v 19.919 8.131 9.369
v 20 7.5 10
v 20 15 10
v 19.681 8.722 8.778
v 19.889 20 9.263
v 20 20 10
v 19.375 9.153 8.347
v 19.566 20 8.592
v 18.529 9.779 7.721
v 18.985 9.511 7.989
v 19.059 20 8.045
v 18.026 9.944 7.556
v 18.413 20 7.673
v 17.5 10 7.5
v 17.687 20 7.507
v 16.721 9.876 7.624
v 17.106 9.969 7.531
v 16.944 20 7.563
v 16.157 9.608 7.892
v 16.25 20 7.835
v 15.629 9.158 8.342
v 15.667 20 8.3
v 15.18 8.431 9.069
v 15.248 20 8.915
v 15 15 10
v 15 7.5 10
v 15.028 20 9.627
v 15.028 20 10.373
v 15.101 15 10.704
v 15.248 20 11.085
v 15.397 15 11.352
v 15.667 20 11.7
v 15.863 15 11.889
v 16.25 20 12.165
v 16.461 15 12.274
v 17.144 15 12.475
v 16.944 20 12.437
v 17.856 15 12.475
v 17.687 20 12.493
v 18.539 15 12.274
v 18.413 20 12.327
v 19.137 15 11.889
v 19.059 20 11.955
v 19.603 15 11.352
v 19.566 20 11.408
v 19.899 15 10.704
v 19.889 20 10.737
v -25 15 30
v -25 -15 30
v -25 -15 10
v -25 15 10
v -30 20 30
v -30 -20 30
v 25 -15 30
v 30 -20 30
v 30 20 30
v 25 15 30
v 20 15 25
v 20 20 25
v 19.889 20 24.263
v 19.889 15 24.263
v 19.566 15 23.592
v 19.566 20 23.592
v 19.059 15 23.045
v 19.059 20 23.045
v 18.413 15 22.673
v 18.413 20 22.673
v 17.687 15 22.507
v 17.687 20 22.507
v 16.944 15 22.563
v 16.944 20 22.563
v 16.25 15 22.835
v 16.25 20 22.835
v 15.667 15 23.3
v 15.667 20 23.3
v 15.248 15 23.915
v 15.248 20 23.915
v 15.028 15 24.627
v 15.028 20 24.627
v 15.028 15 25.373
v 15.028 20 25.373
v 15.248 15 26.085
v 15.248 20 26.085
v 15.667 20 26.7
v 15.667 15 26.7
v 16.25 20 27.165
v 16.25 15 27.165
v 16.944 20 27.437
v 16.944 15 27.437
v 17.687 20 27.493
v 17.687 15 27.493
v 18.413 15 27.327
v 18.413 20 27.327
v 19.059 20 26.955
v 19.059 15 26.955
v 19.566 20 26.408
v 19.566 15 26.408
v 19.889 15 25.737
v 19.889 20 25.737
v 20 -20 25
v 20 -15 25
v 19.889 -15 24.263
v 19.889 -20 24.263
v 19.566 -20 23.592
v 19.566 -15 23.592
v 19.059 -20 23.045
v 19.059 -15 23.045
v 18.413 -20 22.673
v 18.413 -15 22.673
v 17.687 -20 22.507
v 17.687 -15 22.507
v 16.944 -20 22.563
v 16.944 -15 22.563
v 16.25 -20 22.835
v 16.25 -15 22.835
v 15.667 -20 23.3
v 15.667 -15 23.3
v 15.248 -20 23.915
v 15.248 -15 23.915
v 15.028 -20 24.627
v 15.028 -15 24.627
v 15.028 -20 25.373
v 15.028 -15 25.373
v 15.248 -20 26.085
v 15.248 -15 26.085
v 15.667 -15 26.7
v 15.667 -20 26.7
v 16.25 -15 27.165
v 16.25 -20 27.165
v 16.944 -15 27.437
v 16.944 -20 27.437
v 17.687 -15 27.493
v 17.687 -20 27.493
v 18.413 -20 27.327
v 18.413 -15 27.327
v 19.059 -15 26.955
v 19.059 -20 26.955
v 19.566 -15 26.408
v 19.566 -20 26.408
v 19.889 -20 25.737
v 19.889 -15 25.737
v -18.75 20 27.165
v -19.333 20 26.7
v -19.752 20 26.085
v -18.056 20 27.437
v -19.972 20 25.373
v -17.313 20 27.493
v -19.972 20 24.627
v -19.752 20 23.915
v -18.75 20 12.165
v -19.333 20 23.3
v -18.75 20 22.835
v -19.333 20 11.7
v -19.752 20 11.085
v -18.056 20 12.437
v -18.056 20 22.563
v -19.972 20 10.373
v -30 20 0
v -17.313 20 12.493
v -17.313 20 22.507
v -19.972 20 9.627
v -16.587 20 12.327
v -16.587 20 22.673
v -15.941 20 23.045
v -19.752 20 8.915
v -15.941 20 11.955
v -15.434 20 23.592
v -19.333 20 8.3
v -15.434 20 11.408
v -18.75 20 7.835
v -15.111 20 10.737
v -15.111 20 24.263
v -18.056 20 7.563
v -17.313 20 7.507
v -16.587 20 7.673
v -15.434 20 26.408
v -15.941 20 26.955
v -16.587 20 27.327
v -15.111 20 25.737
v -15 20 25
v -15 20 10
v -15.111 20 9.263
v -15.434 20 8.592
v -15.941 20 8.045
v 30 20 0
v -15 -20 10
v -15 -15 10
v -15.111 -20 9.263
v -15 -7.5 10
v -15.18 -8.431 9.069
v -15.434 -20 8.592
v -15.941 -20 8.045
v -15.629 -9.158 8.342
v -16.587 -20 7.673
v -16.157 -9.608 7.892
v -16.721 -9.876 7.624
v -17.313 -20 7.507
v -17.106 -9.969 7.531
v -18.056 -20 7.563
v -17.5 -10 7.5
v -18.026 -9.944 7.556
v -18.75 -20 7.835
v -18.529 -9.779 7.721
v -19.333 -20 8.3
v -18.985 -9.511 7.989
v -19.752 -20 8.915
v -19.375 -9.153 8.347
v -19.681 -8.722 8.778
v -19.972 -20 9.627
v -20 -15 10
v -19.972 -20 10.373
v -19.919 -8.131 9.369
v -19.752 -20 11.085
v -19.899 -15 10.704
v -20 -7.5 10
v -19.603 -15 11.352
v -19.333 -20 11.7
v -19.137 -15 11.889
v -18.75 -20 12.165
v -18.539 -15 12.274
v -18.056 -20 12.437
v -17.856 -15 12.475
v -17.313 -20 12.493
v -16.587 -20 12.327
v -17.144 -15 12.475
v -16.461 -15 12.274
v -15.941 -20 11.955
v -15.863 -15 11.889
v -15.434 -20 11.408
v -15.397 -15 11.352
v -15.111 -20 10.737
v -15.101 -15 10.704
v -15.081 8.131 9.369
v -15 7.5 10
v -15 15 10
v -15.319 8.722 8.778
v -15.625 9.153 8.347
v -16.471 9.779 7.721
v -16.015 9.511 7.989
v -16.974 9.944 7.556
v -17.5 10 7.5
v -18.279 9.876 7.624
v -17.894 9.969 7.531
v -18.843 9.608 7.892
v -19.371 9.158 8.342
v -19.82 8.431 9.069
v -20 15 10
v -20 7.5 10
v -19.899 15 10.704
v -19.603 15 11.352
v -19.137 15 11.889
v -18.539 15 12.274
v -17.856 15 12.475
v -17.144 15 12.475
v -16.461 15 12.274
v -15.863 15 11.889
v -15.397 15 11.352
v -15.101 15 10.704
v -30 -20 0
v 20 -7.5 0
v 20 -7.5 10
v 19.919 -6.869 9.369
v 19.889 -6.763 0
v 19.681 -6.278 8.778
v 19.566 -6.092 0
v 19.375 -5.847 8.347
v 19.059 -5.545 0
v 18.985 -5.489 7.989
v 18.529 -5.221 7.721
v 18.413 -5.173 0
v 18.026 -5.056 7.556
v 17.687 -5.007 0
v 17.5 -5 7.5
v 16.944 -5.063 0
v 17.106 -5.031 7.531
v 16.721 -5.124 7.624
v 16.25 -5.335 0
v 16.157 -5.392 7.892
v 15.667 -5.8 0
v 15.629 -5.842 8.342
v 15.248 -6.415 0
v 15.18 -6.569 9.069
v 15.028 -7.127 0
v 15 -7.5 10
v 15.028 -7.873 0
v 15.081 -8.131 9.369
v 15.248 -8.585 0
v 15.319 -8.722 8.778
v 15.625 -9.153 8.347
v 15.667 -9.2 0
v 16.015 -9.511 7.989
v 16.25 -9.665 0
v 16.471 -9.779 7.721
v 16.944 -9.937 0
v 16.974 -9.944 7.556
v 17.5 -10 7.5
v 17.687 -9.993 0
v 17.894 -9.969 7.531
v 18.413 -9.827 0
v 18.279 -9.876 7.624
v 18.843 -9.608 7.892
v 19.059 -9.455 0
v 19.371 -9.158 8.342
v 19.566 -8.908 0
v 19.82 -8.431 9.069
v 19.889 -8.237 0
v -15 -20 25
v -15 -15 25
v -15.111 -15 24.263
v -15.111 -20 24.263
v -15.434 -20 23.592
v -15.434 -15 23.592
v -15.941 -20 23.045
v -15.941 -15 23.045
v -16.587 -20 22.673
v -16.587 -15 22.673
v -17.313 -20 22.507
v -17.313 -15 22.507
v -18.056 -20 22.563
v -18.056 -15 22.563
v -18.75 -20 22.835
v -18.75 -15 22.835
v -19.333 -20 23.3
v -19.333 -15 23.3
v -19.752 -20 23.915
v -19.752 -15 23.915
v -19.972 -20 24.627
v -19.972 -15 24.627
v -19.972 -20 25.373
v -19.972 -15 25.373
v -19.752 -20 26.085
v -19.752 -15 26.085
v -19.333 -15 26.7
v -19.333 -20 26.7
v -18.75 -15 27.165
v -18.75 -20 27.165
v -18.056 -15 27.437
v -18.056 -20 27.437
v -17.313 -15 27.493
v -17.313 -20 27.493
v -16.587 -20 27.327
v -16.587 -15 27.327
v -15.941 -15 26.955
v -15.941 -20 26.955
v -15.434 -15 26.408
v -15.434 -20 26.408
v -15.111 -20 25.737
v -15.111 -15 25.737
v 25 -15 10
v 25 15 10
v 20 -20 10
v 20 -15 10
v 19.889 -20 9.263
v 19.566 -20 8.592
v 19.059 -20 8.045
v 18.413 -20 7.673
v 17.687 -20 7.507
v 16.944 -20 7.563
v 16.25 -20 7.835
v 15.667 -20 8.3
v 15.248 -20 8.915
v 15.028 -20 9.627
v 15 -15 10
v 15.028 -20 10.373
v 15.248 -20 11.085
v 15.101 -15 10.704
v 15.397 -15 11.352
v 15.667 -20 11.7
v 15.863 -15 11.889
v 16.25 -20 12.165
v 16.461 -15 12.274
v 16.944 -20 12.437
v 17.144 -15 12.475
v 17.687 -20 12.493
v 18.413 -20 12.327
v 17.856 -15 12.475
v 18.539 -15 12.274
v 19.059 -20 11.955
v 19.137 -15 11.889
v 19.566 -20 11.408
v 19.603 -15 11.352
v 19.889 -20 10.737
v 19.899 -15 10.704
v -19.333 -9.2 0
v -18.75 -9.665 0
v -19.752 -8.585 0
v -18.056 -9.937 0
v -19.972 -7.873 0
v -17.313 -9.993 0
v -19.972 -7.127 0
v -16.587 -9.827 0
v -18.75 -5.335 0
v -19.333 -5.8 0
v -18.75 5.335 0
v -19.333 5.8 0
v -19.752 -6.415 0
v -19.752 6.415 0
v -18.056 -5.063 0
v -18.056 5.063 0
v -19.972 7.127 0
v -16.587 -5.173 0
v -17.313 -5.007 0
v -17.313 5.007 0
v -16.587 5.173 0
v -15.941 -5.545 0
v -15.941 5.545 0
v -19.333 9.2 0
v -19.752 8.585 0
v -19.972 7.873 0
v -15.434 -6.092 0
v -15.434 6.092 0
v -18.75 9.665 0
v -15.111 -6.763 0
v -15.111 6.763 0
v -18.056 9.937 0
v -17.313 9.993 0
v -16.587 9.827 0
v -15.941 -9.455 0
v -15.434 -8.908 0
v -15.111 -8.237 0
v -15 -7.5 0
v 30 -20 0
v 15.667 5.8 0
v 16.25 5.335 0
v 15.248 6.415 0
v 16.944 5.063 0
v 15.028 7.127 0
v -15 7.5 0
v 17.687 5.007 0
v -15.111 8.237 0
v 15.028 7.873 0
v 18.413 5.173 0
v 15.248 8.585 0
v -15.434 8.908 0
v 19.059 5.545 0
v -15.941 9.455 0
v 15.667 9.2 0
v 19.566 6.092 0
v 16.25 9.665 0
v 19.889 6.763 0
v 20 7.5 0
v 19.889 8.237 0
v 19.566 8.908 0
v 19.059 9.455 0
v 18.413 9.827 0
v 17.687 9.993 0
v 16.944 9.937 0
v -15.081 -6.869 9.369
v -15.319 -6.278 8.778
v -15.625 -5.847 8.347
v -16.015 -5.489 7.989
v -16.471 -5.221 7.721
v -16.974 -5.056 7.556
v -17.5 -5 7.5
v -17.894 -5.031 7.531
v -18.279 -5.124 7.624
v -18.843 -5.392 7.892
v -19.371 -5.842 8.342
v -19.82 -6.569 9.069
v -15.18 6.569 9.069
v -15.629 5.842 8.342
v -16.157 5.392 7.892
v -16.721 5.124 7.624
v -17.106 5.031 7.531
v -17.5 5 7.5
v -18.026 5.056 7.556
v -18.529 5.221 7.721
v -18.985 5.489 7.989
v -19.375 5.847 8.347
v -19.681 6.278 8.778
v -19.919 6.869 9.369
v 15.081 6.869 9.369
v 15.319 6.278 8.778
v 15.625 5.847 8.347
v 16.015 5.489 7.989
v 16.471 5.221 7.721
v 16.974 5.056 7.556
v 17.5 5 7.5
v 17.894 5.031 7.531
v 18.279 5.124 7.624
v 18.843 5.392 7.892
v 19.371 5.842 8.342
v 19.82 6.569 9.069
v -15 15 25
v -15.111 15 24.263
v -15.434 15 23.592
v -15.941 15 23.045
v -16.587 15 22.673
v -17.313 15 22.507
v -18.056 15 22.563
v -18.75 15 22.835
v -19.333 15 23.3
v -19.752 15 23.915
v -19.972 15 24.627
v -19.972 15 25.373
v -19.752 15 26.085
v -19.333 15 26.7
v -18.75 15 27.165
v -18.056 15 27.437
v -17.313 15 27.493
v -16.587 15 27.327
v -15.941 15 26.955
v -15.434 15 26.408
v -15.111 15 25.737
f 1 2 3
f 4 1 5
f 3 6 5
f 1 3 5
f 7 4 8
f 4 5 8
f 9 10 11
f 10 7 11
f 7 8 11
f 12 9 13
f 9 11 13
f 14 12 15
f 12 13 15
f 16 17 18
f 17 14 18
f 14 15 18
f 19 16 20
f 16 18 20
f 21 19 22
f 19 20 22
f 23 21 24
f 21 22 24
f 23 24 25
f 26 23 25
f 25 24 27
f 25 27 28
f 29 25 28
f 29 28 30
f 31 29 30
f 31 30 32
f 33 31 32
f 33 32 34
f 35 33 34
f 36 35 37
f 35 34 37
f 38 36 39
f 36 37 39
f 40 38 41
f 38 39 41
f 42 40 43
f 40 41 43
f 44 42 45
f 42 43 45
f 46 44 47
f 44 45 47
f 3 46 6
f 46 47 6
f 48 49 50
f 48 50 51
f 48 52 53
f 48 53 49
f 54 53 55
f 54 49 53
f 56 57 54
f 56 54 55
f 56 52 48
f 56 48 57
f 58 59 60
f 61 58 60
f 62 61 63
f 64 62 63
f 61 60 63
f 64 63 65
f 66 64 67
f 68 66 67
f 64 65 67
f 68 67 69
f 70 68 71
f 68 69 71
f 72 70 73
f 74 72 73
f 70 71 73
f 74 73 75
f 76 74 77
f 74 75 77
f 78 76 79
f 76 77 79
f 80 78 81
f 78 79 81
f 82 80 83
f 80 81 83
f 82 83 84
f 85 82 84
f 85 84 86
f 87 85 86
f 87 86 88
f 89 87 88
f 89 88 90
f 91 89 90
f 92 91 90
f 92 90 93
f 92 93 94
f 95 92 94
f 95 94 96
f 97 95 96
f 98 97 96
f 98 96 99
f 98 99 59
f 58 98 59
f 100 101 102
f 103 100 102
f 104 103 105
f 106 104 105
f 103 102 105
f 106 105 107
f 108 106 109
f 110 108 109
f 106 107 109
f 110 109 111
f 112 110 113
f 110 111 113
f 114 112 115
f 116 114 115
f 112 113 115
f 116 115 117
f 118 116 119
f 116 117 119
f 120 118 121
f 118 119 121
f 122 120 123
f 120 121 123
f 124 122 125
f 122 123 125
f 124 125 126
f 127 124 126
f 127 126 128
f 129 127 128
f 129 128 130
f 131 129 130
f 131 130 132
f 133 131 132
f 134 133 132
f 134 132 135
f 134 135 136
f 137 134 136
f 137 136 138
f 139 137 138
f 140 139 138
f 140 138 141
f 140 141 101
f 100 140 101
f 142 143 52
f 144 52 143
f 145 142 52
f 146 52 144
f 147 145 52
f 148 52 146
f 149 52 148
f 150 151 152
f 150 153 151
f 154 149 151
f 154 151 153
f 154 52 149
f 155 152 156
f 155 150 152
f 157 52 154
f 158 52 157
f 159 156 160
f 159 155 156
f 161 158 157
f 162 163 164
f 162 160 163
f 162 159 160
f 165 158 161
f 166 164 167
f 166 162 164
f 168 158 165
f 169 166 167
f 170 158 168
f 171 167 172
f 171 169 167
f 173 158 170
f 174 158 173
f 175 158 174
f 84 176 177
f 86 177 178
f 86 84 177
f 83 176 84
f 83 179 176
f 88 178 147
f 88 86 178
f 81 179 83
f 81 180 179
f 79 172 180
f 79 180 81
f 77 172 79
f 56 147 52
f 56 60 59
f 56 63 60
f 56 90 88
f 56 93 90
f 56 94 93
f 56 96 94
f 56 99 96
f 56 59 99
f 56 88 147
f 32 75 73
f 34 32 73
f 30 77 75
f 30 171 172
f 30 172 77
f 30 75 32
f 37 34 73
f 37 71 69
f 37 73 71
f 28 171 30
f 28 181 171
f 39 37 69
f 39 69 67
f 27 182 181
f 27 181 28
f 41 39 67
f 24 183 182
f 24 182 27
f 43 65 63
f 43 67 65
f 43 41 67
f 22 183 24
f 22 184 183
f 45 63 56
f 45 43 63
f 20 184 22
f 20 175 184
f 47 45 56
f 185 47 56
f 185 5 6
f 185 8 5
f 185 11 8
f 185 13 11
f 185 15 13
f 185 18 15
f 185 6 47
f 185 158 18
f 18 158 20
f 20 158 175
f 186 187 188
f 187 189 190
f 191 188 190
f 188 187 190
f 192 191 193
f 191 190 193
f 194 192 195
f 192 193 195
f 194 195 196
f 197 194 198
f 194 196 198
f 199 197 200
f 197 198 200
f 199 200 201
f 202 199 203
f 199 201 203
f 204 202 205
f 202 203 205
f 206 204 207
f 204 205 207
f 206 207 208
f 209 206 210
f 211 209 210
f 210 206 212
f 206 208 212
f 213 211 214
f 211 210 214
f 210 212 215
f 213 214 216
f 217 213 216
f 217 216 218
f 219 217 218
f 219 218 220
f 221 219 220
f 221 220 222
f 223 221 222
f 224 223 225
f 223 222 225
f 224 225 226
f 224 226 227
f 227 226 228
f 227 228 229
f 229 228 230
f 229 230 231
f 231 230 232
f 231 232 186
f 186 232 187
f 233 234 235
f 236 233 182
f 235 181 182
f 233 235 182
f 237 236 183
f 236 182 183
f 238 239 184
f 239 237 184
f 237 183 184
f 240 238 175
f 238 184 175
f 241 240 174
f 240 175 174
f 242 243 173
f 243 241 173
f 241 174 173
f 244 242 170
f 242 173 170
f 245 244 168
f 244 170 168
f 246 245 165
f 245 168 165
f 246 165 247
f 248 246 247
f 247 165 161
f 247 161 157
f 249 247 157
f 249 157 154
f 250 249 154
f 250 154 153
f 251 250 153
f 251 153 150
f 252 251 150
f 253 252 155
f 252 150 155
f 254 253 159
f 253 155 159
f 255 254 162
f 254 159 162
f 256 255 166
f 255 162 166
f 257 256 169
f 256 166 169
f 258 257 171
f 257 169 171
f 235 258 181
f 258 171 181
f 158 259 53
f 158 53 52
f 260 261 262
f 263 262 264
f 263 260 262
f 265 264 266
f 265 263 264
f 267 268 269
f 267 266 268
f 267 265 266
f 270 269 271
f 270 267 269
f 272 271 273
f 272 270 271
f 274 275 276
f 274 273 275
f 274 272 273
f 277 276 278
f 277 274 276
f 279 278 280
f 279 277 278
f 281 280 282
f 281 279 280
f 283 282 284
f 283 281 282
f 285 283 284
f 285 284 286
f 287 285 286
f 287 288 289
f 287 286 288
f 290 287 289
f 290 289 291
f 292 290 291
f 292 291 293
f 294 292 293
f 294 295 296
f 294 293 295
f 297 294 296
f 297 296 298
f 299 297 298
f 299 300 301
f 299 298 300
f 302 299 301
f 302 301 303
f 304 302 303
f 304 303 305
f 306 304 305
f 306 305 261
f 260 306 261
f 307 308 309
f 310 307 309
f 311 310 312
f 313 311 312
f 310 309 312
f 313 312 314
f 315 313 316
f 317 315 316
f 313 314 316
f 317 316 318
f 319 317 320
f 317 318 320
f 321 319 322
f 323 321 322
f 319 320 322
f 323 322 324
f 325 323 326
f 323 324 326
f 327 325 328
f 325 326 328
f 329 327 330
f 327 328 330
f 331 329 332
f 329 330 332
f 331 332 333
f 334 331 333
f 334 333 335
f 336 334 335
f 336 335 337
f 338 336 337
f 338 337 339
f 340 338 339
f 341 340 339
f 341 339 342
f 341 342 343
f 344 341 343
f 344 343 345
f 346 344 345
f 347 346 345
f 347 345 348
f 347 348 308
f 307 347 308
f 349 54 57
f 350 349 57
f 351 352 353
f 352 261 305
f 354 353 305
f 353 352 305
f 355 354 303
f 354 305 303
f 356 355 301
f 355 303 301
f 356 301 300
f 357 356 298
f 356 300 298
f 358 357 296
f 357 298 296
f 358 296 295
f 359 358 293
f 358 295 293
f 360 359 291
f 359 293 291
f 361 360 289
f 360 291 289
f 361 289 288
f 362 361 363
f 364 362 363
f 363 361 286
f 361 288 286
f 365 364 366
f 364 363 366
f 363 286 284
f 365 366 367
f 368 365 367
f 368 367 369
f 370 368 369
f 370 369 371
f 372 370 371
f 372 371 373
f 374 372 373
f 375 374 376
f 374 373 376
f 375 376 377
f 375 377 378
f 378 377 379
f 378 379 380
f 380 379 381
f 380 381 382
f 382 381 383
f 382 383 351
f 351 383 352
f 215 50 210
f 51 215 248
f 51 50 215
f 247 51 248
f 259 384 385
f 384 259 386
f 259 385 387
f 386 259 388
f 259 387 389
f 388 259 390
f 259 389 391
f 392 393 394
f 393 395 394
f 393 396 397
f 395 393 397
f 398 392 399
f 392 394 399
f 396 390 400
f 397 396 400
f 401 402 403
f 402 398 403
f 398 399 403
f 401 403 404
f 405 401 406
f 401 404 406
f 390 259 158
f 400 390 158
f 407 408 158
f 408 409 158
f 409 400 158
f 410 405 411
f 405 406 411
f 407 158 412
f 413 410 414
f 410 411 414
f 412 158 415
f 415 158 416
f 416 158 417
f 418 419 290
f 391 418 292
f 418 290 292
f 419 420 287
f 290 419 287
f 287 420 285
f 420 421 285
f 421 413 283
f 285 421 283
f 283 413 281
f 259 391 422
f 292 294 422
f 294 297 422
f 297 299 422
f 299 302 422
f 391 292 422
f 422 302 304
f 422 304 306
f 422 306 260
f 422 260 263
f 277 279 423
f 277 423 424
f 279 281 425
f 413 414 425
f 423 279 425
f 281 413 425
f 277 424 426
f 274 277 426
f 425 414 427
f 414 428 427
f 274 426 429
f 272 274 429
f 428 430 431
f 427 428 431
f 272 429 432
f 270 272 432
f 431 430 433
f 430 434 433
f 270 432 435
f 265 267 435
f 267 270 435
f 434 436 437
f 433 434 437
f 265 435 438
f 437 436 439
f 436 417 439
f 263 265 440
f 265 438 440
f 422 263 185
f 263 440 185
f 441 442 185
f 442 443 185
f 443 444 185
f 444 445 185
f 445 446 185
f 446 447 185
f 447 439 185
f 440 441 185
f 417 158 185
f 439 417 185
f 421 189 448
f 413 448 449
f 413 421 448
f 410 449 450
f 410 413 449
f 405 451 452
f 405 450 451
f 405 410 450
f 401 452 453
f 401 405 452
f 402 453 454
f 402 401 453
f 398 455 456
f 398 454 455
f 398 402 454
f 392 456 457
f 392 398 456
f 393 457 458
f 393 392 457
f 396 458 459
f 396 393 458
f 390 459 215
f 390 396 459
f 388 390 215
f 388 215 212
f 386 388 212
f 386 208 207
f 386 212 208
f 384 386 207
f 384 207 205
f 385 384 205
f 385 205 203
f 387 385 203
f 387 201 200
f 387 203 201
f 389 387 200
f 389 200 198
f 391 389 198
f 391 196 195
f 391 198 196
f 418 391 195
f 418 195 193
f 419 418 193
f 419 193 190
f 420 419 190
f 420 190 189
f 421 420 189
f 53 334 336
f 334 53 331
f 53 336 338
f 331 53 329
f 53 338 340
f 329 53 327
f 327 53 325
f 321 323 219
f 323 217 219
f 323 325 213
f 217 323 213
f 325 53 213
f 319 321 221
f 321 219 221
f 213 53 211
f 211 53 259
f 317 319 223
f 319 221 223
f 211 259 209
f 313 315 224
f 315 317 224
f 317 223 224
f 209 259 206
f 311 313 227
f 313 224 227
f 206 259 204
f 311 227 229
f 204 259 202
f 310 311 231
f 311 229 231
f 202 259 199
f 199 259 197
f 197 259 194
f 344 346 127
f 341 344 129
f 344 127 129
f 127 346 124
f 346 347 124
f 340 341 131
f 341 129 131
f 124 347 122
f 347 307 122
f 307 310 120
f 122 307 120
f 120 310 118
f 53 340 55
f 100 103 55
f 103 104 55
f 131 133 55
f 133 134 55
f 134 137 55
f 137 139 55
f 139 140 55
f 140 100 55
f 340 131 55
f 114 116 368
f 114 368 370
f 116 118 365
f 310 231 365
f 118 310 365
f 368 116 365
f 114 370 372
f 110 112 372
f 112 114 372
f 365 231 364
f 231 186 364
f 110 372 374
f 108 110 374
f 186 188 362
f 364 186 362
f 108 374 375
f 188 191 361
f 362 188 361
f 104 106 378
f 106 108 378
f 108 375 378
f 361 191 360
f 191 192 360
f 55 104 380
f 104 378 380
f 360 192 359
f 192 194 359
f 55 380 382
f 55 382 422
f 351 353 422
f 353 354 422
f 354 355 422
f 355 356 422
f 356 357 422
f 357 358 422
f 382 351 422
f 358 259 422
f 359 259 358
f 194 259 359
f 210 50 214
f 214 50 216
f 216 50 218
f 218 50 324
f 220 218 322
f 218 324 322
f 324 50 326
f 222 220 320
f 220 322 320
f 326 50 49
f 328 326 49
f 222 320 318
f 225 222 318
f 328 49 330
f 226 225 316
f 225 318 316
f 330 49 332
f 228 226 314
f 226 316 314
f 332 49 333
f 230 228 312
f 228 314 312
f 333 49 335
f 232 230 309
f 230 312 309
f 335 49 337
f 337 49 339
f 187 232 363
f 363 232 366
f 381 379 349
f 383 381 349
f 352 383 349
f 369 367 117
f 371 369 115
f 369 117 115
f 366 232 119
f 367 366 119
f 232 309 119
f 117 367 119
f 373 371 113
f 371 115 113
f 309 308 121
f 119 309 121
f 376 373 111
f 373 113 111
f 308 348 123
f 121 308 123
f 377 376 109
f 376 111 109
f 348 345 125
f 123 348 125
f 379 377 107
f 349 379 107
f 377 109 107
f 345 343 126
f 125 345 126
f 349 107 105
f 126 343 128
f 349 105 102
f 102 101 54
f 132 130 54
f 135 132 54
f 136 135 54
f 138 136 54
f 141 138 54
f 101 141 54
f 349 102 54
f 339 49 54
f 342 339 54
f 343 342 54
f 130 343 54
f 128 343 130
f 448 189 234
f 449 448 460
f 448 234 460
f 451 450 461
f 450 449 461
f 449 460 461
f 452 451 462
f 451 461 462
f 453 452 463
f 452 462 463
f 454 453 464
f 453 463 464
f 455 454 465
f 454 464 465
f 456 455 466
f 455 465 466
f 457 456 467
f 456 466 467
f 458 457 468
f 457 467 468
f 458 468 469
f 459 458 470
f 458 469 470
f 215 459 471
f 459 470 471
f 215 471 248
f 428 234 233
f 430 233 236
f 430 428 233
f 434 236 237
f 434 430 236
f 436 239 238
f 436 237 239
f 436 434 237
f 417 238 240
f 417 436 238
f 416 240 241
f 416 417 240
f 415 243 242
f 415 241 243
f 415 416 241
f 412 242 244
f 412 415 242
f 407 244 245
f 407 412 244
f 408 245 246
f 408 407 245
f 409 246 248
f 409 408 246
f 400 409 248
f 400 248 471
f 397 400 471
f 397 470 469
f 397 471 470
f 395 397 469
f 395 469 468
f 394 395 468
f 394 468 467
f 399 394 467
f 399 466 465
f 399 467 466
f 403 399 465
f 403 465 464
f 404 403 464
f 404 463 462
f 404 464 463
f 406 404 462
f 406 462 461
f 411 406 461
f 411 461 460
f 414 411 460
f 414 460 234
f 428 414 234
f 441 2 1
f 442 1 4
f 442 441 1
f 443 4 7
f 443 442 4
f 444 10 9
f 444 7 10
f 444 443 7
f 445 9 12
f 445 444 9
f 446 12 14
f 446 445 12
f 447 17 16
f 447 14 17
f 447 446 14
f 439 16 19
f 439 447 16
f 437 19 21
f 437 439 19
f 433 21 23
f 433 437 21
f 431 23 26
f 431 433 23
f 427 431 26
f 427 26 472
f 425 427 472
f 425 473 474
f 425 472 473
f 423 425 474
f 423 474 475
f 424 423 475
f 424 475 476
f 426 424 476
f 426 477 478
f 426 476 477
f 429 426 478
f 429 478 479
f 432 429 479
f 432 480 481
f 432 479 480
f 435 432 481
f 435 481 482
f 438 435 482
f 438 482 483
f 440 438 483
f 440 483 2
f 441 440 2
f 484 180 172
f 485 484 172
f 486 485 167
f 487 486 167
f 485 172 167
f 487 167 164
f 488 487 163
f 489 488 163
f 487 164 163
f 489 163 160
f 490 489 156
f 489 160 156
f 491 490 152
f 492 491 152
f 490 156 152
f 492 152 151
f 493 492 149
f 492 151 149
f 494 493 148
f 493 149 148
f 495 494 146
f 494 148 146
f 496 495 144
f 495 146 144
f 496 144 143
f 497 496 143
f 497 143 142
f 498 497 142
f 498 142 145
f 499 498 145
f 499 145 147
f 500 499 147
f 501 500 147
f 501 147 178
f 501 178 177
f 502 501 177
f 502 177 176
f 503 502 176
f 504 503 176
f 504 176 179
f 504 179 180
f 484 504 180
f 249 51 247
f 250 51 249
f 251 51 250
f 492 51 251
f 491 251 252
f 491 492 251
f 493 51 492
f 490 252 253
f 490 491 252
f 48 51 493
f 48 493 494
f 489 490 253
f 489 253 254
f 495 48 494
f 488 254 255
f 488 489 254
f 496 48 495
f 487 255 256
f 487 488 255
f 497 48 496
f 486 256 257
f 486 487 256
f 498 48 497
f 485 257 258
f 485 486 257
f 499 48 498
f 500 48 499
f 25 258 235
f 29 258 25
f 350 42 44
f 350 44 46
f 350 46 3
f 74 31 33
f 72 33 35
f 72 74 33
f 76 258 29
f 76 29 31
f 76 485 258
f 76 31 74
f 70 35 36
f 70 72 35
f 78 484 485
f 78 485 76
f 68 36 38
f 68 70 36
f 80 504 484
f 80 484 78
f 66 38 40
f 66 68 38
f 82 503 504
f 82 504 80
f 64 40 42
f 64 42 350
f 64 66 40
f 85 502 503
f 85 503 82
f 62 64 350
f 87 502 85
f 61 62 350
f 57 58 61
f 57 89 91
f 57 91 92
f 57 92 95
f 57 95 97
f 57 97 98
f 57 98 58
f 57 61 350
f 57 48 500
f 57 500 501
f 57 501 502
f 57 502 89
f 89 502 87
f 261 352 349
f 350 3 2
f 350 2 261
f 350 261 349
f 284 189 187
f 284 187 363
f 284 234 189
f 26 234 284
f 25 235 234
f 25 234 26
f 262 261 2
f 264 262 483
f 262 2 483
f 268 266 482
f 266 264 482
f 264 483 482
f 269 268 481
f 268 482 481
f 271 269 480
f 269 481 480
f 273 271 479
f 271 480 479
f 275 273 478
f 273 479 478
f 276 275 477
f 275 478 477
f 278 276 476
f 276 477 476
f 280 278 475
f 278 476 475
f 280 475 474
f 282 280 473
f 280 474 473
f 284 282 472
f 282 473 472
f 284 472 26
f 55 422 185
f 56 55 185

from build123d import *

# Parameters (mm, degrees)
SKETCH1_W           = 60
SKETCH1_H           = 40
SKETCH1_R           = 2.5
BOSS_EXTRUDE3_DEPTH = 30
SKETCH4_W           = 50
SKETCH4_H           = 30
CUT_EXTRUDE1_DEPTH  = 20
SKETCH5_R           = 2.5
CUT_EXTRUDE4_DEPTH  = 49


with BuildPart() as part:
    # Sketch1 → Boss-Extrude3 (new body)
    with BuildSketch(Plane.XY):
        Rectangle(SKETCH1_W, SKETCH1_H)
        with Locations((-17.5, 7.5)):
            Circle(SKETCH1_R, mode=Mode.SUBTRACT)
        with Locations((17.5, 7.5)):
            Circle(SKETCH1_R, mode=Mode.SUBTRACT)
        with Locations((-17.5, -7.5)):
            Circle(SKETCH1_R, mode=Mode.SUBTRACT)
        with Locations((17.5, -7.5)):
            Circle(SKETCH1_R, mode=Mode.SUBTRACT)
    extrude(amount=BOSS_EXTRUDE3_DEPTH)

    # Sketch4 → Cut-Extrude1 (cut)
    with BuildSketch(Plane.XY.offset(30)):
        Rectangle(SKETCH4_W, SKETCH4_H)
    extrude(amount=-CUT_EXTRUDE1_DEPTH, mode=Mode.SUBTRACT)

    # Sketch5 → Cut-Extrude4 (cut)
    with BuildSketch(Plane(origin=(0, 20, 0), x_dir=(1, 0, 0), z_dir=(0, 1, 0))):
        with Locations((-17.5, -10)):
            Circle(SKETCH5_R)
        with Locations((17.5, -10)):
            Circle(SKETCH5_R)
        with Locations((17.5, -25)):
            Circle(SKETCH5_R)
        with Locations((-17.5, -25)):
            Circle(SKETCH5_R)
    extrude(amount=-CUT_EXTRUDE4_DEPTH, mode=Mode.SUBTRACT)


solid = part.part
